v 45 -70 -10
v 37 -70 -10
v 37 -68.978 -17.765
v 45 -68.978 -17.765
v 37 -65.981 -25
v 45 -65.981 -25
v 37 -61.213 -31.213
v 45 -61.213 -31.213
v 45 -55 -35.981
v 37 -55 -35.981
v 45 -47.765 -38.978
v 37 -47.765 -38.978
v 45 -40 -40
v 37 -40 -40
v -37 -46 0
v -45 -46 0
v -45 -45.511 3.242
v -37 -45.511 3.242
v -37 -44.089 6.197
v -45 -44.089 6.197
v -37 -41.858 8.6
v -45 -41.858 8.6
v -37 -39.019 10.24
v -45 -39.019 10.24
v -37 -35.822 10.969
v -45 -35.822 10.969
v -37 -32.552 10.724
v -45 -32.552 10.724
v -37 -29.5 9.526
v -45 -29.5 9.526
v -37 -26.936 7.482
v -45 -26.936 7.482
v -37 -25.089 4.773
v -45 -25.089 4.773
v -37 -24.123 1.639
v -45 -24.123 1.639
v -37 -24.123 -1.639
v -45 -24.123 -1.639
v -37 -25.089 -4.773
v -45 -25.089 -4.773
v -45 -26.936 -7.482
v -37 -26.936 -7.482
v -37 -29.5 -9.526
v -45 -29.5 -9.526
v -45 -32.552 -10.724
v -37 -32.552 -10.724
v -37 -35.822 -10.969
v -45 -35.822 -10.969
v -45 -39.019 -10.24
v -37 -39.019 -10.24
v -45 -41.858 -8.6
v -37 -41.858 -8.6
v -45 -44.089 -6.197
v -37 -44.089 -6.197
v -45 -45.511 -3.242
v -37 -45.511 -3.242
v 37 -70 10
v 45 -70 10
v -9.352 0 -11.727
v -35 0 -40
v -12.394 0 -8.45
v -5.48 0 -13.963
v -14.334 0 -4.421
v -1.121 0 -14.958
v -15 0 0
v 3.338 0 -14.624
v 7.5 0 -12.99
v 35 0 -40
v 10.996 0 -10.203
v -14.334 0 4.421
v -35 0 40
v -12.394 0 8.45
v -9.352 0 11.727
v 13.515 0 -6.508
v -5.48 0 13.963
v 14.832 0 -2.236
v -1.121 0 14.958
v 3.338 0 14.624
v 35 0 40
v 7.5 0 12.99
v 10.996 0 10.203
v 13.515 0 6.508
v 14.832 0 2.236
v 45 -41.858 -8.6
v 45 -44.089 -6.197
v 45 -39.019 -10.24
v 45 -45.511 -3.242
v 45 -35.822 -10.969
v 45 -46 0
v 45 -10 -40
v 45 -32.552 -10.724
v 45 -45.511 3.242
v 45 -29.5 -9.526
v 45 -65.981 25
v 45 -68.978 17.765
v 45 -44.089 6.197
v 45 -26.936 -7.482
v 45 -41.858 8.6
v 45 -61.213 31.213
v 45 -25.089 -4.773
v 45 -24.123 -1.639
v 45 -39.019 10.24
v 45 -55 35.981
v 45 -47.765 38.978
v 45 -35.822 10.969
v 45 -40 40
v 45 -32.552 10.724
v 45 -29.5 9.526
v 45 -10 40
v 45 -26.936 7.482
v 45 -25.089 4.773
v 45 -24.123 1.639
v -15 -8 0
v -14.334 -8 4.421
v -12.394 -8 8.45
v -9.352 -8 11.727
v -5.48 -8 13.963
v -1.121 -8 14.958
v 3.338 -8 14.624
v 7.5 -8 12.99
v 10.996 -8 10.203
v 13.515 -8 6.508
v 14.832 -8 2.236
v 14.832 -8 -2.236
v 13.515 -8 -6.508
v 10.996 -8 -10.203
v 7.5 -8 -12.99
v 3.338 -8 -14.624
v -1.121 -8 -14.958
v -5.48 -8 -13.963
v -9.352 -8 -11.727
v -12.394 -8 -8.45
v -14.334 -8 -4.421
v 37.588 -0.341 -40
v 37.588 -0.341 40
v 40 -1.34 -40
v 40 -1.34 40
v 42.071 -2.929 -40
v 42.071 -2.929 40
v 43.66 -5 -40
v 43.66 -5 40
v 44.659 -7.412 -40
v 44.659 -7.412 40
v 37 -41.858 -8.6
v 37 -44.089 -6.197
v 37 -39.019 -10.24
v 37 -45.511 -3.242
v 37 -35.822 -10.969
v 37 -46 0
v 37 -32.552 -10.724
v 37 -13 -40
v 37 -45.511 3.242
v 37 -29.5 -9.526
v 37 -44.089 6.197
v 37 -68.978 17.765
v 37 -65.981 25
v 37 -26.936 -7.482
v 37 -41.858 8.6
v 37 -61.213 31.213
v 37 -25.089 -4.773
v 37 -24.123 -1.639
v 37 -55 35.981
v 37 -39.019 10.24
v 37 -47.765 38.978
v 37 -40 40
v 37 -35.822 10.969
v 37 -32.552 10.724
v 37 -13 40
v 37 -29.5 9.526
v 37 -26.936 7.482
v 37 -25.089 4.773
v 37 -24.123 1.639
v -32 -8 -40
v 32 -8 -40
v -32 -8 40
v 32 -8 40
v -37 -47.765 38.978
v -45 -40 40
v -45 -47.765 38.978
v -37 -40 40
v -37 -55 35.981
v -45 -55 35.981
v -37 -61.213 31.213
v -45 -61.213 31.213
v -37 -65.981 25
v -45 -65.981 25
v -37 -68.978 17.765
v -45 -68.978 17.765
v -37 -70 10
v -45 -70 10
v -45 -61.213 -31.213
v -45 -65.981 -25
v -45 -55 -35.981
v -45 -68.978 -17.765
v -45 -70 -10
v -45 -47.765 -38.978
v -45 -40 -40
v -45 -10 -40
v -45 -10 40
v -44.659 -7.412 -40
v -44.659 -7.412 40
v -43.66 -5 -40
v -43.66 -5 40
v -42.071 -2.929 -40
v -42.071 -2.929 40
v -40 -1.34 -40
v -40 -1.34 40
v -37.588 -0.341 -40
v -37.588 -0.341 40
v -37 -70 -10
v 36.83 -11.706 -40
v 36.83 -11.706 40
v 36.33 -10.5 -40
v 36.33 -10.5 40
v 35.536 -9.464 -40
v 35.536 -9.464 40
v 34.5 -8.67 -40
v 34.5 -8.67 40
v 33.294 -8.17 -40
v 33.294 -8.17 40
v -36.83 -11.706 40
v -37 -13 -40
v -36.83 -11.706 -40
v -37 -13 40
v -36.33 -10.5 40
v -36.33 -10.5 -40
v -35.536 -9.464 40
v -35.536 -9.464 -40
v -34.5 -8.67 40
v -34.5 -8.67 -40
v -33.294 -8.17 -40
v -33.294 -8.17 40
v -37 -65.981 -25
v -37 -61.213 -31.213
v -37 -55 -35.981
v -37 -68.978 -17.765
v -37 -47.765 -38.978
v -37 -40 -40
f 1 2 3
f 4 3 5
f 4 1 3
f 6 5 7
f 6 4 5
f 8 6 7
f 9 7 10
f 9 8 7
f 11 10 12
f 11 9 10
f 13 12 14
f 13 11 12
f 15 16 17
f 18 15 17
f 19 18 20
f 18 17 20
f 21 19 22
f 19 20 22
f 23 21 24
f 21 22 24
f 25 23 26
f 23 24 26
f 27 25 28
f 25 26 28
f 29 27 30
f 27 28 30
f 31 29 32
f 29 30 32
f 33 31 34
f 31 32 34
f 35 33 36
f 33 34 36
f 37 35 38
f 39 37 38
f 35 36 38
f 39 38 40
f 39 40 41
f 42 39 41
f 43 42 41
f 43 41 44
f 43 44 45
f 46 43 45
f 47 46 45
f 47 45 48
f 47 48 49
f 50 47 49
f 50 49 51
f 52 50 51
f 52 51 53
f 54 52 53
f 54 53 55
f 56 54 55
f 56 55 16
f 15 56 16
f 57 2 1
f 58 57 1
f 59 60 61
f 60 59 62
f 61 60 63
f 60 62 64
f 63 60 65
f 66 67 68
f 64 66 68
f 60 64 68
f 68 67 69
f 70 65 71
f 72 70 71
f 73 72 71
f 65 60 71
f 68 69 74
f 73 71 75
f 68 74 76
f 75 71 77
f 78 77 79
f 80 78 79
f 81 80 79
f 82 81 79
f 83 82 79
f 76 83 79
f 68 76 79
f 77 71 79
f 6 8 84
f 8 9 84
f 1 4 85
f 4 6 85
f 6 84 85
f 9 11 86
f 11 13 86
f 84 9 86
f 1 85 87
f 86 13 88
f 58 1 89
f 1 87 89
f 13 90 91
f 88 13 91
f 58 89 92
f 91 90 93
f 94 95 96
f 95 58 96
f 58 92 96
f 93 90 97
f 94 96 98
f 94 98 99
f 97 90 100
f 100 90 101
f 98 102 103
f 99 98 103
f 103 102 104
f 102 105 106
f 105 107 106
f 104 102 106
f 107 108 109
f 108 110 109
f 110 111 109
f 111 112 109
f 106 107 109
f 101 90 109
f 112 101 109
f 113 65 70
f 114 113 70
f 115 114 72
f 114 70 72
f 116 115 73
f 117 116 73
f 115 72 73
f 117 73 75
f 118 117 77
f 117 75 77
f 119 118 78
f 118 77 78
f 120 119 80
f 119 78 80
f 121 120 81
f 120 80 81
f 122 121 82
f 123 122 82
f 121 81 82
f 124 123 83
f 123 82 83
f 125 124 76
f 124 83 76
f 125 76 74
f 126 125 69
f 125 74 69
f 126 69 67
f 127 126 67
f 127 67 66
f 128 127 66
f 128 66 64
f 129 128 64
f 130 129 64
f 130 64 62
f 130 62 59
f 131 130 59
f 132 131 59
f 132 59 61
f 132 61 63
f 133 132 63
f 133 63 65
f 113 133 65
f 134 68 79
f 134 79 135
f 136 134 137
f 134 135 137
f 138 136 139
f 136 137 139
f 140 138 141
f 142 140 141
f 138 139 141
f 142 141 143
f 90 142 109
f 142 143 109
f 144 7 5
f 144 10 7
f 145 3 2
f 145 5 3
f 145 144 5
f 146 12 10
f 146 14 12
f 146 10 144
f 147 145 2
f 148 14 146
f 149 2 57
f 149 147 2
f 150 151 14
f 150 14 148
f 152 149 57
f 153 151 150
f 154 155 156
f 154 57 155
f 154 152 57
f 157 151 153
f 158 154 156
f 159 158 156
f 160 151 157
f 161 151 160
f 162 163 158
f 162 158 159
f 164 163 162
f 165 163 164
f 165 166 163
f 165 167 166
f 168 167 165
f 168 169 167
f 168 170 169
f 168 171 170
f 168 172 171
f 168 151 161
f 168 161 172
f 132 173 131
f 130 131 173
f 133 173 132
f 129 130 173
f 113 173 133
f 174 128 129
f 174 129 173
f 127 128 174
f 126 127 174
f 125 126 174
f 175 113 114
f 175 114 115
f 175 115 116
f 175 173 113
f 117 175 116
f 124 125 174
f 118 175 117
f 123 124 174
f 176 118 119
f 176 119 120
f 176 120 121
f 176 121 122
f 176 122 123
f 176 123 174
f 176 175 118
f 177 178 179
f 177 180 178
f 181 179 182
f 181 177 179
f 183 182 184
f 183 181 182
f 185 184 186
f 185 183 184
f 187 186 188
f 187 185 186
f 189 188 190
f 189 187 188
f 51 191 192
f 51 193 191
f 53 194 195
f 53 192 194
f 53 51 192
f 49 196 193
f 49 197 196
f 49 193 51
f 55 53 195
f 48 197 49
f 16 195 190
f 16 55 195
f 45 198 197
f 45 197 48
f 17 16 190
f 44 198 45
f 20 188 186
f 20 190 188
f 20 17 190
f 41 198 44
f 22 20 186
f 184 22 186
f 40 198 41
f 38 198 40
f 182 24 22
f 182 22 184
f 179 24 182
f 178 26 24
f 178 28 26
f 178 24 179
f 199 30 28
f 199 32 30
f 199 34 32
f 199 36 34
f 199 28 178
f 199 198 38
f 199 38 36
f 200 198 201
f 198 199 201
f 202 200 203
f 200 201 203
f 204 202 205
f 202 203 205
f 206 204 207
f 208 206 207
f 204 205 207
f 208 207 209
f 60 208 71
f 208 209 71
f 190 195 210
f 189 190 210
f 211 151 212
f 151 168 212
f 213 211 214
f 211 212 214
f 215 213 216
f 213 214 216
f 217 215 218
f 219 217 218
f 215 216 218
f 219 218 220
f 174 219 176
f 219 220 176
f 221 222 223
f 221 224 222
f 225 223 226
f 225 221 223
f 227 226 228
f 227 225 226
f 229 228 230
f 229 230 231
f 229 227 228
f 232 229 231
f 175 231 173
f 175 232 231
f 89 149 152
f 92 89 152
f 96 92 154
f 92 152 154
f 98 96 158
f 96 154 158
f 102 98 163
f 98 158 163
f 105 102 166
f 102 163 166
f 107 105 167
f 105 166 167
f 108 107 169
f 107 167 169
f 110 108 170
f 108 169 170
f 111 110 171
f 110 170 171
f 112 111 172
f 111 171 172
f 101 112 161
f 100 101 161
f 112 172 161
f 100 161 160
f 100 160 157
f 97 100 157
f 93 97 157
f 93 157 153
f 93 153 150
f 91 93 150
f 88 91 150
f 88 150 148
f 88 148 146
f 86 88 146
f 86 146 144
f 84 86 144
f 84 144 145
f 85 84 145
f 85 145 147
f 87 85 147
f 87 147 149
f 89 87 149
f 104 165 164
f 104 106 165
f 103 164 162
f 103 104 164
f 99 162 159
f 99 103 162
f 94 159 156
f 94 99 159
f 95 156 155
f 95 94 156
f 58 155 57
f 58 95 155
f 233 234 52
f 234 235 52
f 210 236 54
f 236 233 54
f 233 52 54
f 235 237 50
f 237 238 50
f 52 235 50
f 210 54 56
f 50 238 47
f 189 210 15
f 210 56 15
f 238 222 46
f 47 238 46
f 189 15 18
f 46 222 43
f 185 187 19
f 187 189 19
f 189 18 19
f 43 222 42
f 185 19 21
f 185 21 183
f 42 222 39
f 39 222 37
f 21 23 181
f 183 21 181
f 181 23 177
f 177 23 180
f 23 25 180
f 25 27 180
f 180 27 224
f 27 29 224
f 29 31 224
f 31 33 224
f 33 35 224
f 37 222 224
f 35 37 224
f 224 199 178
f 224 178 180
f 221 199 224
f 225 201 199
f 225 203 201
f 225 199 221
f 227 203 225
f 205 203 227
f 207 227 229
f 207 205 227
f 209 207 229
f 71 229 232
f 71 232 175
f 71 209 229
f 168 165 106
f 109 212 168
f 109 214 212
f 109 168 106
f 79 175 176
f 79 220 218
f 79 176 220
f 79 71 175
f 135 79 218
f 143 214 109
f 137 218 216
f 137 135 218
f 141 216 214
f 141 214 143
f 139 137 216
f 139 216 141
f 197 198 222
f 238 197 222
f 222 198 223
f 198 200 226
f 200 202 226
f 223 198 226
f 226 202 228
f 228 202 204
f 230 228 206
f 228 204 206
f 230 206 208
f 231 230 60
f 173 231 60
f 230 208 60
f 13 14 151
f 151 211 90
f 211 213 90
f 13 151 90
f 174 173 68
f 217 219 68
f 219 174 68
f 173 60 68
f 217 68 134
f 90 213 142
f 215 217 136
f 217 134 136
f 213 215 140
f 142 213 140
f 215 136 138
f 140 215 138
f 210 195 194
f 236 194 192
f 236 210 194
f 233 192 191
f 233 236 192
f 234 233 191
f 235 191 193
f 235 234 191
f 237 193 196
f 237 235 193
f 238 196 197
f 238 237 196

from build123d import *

# Parameters (mm, degrees)
F0_W     = 90
F0_H     = 80
F1_DEPTH = 70
F2_T     = -8
F3_R     = 5
F4_R     = 10
F5_R     = 30
F7_D     = 30
F9_D     = 22


with BuildPart() as f1:
    # F0 (on Front) → F1 (new body)
    with BuildSketch(Plane.XZ):
        Rectangle(F0_W, F0_H)
    extrude(amount=F1_DEPTH)

    # F2
    f2_openings = [f1.faces().sort_by_distance(p)[0] for p in [
        (0, -70, 0),
        (0, -35, 40),
        (0, -35, -40),
    ]]
    offset(amount=F2_T, openings=f2_openings)

    # F3
    f3_edges = [f1.edges().sort_by_distance(p)[0] for p in [
        (-37, -8, 0),
        (37, -8, 0),
    ]]
    fillet(f3_edges, radius=F3_R)

    # F4
    f4_edges = [f1.edges().sort_by_distance(p)[0] for p in [
        (-45, 0, 0),
        (45, 0, 0),
    ]]
    fillet(f4_edges, radius=F4_R)

    # F5
    f5_edges = [f1.edges().sort_by_distance(p)[0] for p in [
        (41, -70, 40),
        (-41, -70, 40),
        (41, -70, -40),
        (-41, -70, -40),
    ]]
    fillet(f5_edges, radius=F5_R)

    # F7 (through all)
    with Locations(Plane.XZ.offset(8)):
        with Locations((0, 0)):
            Hole(F7_D / 2)

    # F9 (through all)
    with Locations(Plane.YZ.offset(45)):
        with Locations((-35, 0)):
            Hole(F9_D / 2)


solid = f1.part
